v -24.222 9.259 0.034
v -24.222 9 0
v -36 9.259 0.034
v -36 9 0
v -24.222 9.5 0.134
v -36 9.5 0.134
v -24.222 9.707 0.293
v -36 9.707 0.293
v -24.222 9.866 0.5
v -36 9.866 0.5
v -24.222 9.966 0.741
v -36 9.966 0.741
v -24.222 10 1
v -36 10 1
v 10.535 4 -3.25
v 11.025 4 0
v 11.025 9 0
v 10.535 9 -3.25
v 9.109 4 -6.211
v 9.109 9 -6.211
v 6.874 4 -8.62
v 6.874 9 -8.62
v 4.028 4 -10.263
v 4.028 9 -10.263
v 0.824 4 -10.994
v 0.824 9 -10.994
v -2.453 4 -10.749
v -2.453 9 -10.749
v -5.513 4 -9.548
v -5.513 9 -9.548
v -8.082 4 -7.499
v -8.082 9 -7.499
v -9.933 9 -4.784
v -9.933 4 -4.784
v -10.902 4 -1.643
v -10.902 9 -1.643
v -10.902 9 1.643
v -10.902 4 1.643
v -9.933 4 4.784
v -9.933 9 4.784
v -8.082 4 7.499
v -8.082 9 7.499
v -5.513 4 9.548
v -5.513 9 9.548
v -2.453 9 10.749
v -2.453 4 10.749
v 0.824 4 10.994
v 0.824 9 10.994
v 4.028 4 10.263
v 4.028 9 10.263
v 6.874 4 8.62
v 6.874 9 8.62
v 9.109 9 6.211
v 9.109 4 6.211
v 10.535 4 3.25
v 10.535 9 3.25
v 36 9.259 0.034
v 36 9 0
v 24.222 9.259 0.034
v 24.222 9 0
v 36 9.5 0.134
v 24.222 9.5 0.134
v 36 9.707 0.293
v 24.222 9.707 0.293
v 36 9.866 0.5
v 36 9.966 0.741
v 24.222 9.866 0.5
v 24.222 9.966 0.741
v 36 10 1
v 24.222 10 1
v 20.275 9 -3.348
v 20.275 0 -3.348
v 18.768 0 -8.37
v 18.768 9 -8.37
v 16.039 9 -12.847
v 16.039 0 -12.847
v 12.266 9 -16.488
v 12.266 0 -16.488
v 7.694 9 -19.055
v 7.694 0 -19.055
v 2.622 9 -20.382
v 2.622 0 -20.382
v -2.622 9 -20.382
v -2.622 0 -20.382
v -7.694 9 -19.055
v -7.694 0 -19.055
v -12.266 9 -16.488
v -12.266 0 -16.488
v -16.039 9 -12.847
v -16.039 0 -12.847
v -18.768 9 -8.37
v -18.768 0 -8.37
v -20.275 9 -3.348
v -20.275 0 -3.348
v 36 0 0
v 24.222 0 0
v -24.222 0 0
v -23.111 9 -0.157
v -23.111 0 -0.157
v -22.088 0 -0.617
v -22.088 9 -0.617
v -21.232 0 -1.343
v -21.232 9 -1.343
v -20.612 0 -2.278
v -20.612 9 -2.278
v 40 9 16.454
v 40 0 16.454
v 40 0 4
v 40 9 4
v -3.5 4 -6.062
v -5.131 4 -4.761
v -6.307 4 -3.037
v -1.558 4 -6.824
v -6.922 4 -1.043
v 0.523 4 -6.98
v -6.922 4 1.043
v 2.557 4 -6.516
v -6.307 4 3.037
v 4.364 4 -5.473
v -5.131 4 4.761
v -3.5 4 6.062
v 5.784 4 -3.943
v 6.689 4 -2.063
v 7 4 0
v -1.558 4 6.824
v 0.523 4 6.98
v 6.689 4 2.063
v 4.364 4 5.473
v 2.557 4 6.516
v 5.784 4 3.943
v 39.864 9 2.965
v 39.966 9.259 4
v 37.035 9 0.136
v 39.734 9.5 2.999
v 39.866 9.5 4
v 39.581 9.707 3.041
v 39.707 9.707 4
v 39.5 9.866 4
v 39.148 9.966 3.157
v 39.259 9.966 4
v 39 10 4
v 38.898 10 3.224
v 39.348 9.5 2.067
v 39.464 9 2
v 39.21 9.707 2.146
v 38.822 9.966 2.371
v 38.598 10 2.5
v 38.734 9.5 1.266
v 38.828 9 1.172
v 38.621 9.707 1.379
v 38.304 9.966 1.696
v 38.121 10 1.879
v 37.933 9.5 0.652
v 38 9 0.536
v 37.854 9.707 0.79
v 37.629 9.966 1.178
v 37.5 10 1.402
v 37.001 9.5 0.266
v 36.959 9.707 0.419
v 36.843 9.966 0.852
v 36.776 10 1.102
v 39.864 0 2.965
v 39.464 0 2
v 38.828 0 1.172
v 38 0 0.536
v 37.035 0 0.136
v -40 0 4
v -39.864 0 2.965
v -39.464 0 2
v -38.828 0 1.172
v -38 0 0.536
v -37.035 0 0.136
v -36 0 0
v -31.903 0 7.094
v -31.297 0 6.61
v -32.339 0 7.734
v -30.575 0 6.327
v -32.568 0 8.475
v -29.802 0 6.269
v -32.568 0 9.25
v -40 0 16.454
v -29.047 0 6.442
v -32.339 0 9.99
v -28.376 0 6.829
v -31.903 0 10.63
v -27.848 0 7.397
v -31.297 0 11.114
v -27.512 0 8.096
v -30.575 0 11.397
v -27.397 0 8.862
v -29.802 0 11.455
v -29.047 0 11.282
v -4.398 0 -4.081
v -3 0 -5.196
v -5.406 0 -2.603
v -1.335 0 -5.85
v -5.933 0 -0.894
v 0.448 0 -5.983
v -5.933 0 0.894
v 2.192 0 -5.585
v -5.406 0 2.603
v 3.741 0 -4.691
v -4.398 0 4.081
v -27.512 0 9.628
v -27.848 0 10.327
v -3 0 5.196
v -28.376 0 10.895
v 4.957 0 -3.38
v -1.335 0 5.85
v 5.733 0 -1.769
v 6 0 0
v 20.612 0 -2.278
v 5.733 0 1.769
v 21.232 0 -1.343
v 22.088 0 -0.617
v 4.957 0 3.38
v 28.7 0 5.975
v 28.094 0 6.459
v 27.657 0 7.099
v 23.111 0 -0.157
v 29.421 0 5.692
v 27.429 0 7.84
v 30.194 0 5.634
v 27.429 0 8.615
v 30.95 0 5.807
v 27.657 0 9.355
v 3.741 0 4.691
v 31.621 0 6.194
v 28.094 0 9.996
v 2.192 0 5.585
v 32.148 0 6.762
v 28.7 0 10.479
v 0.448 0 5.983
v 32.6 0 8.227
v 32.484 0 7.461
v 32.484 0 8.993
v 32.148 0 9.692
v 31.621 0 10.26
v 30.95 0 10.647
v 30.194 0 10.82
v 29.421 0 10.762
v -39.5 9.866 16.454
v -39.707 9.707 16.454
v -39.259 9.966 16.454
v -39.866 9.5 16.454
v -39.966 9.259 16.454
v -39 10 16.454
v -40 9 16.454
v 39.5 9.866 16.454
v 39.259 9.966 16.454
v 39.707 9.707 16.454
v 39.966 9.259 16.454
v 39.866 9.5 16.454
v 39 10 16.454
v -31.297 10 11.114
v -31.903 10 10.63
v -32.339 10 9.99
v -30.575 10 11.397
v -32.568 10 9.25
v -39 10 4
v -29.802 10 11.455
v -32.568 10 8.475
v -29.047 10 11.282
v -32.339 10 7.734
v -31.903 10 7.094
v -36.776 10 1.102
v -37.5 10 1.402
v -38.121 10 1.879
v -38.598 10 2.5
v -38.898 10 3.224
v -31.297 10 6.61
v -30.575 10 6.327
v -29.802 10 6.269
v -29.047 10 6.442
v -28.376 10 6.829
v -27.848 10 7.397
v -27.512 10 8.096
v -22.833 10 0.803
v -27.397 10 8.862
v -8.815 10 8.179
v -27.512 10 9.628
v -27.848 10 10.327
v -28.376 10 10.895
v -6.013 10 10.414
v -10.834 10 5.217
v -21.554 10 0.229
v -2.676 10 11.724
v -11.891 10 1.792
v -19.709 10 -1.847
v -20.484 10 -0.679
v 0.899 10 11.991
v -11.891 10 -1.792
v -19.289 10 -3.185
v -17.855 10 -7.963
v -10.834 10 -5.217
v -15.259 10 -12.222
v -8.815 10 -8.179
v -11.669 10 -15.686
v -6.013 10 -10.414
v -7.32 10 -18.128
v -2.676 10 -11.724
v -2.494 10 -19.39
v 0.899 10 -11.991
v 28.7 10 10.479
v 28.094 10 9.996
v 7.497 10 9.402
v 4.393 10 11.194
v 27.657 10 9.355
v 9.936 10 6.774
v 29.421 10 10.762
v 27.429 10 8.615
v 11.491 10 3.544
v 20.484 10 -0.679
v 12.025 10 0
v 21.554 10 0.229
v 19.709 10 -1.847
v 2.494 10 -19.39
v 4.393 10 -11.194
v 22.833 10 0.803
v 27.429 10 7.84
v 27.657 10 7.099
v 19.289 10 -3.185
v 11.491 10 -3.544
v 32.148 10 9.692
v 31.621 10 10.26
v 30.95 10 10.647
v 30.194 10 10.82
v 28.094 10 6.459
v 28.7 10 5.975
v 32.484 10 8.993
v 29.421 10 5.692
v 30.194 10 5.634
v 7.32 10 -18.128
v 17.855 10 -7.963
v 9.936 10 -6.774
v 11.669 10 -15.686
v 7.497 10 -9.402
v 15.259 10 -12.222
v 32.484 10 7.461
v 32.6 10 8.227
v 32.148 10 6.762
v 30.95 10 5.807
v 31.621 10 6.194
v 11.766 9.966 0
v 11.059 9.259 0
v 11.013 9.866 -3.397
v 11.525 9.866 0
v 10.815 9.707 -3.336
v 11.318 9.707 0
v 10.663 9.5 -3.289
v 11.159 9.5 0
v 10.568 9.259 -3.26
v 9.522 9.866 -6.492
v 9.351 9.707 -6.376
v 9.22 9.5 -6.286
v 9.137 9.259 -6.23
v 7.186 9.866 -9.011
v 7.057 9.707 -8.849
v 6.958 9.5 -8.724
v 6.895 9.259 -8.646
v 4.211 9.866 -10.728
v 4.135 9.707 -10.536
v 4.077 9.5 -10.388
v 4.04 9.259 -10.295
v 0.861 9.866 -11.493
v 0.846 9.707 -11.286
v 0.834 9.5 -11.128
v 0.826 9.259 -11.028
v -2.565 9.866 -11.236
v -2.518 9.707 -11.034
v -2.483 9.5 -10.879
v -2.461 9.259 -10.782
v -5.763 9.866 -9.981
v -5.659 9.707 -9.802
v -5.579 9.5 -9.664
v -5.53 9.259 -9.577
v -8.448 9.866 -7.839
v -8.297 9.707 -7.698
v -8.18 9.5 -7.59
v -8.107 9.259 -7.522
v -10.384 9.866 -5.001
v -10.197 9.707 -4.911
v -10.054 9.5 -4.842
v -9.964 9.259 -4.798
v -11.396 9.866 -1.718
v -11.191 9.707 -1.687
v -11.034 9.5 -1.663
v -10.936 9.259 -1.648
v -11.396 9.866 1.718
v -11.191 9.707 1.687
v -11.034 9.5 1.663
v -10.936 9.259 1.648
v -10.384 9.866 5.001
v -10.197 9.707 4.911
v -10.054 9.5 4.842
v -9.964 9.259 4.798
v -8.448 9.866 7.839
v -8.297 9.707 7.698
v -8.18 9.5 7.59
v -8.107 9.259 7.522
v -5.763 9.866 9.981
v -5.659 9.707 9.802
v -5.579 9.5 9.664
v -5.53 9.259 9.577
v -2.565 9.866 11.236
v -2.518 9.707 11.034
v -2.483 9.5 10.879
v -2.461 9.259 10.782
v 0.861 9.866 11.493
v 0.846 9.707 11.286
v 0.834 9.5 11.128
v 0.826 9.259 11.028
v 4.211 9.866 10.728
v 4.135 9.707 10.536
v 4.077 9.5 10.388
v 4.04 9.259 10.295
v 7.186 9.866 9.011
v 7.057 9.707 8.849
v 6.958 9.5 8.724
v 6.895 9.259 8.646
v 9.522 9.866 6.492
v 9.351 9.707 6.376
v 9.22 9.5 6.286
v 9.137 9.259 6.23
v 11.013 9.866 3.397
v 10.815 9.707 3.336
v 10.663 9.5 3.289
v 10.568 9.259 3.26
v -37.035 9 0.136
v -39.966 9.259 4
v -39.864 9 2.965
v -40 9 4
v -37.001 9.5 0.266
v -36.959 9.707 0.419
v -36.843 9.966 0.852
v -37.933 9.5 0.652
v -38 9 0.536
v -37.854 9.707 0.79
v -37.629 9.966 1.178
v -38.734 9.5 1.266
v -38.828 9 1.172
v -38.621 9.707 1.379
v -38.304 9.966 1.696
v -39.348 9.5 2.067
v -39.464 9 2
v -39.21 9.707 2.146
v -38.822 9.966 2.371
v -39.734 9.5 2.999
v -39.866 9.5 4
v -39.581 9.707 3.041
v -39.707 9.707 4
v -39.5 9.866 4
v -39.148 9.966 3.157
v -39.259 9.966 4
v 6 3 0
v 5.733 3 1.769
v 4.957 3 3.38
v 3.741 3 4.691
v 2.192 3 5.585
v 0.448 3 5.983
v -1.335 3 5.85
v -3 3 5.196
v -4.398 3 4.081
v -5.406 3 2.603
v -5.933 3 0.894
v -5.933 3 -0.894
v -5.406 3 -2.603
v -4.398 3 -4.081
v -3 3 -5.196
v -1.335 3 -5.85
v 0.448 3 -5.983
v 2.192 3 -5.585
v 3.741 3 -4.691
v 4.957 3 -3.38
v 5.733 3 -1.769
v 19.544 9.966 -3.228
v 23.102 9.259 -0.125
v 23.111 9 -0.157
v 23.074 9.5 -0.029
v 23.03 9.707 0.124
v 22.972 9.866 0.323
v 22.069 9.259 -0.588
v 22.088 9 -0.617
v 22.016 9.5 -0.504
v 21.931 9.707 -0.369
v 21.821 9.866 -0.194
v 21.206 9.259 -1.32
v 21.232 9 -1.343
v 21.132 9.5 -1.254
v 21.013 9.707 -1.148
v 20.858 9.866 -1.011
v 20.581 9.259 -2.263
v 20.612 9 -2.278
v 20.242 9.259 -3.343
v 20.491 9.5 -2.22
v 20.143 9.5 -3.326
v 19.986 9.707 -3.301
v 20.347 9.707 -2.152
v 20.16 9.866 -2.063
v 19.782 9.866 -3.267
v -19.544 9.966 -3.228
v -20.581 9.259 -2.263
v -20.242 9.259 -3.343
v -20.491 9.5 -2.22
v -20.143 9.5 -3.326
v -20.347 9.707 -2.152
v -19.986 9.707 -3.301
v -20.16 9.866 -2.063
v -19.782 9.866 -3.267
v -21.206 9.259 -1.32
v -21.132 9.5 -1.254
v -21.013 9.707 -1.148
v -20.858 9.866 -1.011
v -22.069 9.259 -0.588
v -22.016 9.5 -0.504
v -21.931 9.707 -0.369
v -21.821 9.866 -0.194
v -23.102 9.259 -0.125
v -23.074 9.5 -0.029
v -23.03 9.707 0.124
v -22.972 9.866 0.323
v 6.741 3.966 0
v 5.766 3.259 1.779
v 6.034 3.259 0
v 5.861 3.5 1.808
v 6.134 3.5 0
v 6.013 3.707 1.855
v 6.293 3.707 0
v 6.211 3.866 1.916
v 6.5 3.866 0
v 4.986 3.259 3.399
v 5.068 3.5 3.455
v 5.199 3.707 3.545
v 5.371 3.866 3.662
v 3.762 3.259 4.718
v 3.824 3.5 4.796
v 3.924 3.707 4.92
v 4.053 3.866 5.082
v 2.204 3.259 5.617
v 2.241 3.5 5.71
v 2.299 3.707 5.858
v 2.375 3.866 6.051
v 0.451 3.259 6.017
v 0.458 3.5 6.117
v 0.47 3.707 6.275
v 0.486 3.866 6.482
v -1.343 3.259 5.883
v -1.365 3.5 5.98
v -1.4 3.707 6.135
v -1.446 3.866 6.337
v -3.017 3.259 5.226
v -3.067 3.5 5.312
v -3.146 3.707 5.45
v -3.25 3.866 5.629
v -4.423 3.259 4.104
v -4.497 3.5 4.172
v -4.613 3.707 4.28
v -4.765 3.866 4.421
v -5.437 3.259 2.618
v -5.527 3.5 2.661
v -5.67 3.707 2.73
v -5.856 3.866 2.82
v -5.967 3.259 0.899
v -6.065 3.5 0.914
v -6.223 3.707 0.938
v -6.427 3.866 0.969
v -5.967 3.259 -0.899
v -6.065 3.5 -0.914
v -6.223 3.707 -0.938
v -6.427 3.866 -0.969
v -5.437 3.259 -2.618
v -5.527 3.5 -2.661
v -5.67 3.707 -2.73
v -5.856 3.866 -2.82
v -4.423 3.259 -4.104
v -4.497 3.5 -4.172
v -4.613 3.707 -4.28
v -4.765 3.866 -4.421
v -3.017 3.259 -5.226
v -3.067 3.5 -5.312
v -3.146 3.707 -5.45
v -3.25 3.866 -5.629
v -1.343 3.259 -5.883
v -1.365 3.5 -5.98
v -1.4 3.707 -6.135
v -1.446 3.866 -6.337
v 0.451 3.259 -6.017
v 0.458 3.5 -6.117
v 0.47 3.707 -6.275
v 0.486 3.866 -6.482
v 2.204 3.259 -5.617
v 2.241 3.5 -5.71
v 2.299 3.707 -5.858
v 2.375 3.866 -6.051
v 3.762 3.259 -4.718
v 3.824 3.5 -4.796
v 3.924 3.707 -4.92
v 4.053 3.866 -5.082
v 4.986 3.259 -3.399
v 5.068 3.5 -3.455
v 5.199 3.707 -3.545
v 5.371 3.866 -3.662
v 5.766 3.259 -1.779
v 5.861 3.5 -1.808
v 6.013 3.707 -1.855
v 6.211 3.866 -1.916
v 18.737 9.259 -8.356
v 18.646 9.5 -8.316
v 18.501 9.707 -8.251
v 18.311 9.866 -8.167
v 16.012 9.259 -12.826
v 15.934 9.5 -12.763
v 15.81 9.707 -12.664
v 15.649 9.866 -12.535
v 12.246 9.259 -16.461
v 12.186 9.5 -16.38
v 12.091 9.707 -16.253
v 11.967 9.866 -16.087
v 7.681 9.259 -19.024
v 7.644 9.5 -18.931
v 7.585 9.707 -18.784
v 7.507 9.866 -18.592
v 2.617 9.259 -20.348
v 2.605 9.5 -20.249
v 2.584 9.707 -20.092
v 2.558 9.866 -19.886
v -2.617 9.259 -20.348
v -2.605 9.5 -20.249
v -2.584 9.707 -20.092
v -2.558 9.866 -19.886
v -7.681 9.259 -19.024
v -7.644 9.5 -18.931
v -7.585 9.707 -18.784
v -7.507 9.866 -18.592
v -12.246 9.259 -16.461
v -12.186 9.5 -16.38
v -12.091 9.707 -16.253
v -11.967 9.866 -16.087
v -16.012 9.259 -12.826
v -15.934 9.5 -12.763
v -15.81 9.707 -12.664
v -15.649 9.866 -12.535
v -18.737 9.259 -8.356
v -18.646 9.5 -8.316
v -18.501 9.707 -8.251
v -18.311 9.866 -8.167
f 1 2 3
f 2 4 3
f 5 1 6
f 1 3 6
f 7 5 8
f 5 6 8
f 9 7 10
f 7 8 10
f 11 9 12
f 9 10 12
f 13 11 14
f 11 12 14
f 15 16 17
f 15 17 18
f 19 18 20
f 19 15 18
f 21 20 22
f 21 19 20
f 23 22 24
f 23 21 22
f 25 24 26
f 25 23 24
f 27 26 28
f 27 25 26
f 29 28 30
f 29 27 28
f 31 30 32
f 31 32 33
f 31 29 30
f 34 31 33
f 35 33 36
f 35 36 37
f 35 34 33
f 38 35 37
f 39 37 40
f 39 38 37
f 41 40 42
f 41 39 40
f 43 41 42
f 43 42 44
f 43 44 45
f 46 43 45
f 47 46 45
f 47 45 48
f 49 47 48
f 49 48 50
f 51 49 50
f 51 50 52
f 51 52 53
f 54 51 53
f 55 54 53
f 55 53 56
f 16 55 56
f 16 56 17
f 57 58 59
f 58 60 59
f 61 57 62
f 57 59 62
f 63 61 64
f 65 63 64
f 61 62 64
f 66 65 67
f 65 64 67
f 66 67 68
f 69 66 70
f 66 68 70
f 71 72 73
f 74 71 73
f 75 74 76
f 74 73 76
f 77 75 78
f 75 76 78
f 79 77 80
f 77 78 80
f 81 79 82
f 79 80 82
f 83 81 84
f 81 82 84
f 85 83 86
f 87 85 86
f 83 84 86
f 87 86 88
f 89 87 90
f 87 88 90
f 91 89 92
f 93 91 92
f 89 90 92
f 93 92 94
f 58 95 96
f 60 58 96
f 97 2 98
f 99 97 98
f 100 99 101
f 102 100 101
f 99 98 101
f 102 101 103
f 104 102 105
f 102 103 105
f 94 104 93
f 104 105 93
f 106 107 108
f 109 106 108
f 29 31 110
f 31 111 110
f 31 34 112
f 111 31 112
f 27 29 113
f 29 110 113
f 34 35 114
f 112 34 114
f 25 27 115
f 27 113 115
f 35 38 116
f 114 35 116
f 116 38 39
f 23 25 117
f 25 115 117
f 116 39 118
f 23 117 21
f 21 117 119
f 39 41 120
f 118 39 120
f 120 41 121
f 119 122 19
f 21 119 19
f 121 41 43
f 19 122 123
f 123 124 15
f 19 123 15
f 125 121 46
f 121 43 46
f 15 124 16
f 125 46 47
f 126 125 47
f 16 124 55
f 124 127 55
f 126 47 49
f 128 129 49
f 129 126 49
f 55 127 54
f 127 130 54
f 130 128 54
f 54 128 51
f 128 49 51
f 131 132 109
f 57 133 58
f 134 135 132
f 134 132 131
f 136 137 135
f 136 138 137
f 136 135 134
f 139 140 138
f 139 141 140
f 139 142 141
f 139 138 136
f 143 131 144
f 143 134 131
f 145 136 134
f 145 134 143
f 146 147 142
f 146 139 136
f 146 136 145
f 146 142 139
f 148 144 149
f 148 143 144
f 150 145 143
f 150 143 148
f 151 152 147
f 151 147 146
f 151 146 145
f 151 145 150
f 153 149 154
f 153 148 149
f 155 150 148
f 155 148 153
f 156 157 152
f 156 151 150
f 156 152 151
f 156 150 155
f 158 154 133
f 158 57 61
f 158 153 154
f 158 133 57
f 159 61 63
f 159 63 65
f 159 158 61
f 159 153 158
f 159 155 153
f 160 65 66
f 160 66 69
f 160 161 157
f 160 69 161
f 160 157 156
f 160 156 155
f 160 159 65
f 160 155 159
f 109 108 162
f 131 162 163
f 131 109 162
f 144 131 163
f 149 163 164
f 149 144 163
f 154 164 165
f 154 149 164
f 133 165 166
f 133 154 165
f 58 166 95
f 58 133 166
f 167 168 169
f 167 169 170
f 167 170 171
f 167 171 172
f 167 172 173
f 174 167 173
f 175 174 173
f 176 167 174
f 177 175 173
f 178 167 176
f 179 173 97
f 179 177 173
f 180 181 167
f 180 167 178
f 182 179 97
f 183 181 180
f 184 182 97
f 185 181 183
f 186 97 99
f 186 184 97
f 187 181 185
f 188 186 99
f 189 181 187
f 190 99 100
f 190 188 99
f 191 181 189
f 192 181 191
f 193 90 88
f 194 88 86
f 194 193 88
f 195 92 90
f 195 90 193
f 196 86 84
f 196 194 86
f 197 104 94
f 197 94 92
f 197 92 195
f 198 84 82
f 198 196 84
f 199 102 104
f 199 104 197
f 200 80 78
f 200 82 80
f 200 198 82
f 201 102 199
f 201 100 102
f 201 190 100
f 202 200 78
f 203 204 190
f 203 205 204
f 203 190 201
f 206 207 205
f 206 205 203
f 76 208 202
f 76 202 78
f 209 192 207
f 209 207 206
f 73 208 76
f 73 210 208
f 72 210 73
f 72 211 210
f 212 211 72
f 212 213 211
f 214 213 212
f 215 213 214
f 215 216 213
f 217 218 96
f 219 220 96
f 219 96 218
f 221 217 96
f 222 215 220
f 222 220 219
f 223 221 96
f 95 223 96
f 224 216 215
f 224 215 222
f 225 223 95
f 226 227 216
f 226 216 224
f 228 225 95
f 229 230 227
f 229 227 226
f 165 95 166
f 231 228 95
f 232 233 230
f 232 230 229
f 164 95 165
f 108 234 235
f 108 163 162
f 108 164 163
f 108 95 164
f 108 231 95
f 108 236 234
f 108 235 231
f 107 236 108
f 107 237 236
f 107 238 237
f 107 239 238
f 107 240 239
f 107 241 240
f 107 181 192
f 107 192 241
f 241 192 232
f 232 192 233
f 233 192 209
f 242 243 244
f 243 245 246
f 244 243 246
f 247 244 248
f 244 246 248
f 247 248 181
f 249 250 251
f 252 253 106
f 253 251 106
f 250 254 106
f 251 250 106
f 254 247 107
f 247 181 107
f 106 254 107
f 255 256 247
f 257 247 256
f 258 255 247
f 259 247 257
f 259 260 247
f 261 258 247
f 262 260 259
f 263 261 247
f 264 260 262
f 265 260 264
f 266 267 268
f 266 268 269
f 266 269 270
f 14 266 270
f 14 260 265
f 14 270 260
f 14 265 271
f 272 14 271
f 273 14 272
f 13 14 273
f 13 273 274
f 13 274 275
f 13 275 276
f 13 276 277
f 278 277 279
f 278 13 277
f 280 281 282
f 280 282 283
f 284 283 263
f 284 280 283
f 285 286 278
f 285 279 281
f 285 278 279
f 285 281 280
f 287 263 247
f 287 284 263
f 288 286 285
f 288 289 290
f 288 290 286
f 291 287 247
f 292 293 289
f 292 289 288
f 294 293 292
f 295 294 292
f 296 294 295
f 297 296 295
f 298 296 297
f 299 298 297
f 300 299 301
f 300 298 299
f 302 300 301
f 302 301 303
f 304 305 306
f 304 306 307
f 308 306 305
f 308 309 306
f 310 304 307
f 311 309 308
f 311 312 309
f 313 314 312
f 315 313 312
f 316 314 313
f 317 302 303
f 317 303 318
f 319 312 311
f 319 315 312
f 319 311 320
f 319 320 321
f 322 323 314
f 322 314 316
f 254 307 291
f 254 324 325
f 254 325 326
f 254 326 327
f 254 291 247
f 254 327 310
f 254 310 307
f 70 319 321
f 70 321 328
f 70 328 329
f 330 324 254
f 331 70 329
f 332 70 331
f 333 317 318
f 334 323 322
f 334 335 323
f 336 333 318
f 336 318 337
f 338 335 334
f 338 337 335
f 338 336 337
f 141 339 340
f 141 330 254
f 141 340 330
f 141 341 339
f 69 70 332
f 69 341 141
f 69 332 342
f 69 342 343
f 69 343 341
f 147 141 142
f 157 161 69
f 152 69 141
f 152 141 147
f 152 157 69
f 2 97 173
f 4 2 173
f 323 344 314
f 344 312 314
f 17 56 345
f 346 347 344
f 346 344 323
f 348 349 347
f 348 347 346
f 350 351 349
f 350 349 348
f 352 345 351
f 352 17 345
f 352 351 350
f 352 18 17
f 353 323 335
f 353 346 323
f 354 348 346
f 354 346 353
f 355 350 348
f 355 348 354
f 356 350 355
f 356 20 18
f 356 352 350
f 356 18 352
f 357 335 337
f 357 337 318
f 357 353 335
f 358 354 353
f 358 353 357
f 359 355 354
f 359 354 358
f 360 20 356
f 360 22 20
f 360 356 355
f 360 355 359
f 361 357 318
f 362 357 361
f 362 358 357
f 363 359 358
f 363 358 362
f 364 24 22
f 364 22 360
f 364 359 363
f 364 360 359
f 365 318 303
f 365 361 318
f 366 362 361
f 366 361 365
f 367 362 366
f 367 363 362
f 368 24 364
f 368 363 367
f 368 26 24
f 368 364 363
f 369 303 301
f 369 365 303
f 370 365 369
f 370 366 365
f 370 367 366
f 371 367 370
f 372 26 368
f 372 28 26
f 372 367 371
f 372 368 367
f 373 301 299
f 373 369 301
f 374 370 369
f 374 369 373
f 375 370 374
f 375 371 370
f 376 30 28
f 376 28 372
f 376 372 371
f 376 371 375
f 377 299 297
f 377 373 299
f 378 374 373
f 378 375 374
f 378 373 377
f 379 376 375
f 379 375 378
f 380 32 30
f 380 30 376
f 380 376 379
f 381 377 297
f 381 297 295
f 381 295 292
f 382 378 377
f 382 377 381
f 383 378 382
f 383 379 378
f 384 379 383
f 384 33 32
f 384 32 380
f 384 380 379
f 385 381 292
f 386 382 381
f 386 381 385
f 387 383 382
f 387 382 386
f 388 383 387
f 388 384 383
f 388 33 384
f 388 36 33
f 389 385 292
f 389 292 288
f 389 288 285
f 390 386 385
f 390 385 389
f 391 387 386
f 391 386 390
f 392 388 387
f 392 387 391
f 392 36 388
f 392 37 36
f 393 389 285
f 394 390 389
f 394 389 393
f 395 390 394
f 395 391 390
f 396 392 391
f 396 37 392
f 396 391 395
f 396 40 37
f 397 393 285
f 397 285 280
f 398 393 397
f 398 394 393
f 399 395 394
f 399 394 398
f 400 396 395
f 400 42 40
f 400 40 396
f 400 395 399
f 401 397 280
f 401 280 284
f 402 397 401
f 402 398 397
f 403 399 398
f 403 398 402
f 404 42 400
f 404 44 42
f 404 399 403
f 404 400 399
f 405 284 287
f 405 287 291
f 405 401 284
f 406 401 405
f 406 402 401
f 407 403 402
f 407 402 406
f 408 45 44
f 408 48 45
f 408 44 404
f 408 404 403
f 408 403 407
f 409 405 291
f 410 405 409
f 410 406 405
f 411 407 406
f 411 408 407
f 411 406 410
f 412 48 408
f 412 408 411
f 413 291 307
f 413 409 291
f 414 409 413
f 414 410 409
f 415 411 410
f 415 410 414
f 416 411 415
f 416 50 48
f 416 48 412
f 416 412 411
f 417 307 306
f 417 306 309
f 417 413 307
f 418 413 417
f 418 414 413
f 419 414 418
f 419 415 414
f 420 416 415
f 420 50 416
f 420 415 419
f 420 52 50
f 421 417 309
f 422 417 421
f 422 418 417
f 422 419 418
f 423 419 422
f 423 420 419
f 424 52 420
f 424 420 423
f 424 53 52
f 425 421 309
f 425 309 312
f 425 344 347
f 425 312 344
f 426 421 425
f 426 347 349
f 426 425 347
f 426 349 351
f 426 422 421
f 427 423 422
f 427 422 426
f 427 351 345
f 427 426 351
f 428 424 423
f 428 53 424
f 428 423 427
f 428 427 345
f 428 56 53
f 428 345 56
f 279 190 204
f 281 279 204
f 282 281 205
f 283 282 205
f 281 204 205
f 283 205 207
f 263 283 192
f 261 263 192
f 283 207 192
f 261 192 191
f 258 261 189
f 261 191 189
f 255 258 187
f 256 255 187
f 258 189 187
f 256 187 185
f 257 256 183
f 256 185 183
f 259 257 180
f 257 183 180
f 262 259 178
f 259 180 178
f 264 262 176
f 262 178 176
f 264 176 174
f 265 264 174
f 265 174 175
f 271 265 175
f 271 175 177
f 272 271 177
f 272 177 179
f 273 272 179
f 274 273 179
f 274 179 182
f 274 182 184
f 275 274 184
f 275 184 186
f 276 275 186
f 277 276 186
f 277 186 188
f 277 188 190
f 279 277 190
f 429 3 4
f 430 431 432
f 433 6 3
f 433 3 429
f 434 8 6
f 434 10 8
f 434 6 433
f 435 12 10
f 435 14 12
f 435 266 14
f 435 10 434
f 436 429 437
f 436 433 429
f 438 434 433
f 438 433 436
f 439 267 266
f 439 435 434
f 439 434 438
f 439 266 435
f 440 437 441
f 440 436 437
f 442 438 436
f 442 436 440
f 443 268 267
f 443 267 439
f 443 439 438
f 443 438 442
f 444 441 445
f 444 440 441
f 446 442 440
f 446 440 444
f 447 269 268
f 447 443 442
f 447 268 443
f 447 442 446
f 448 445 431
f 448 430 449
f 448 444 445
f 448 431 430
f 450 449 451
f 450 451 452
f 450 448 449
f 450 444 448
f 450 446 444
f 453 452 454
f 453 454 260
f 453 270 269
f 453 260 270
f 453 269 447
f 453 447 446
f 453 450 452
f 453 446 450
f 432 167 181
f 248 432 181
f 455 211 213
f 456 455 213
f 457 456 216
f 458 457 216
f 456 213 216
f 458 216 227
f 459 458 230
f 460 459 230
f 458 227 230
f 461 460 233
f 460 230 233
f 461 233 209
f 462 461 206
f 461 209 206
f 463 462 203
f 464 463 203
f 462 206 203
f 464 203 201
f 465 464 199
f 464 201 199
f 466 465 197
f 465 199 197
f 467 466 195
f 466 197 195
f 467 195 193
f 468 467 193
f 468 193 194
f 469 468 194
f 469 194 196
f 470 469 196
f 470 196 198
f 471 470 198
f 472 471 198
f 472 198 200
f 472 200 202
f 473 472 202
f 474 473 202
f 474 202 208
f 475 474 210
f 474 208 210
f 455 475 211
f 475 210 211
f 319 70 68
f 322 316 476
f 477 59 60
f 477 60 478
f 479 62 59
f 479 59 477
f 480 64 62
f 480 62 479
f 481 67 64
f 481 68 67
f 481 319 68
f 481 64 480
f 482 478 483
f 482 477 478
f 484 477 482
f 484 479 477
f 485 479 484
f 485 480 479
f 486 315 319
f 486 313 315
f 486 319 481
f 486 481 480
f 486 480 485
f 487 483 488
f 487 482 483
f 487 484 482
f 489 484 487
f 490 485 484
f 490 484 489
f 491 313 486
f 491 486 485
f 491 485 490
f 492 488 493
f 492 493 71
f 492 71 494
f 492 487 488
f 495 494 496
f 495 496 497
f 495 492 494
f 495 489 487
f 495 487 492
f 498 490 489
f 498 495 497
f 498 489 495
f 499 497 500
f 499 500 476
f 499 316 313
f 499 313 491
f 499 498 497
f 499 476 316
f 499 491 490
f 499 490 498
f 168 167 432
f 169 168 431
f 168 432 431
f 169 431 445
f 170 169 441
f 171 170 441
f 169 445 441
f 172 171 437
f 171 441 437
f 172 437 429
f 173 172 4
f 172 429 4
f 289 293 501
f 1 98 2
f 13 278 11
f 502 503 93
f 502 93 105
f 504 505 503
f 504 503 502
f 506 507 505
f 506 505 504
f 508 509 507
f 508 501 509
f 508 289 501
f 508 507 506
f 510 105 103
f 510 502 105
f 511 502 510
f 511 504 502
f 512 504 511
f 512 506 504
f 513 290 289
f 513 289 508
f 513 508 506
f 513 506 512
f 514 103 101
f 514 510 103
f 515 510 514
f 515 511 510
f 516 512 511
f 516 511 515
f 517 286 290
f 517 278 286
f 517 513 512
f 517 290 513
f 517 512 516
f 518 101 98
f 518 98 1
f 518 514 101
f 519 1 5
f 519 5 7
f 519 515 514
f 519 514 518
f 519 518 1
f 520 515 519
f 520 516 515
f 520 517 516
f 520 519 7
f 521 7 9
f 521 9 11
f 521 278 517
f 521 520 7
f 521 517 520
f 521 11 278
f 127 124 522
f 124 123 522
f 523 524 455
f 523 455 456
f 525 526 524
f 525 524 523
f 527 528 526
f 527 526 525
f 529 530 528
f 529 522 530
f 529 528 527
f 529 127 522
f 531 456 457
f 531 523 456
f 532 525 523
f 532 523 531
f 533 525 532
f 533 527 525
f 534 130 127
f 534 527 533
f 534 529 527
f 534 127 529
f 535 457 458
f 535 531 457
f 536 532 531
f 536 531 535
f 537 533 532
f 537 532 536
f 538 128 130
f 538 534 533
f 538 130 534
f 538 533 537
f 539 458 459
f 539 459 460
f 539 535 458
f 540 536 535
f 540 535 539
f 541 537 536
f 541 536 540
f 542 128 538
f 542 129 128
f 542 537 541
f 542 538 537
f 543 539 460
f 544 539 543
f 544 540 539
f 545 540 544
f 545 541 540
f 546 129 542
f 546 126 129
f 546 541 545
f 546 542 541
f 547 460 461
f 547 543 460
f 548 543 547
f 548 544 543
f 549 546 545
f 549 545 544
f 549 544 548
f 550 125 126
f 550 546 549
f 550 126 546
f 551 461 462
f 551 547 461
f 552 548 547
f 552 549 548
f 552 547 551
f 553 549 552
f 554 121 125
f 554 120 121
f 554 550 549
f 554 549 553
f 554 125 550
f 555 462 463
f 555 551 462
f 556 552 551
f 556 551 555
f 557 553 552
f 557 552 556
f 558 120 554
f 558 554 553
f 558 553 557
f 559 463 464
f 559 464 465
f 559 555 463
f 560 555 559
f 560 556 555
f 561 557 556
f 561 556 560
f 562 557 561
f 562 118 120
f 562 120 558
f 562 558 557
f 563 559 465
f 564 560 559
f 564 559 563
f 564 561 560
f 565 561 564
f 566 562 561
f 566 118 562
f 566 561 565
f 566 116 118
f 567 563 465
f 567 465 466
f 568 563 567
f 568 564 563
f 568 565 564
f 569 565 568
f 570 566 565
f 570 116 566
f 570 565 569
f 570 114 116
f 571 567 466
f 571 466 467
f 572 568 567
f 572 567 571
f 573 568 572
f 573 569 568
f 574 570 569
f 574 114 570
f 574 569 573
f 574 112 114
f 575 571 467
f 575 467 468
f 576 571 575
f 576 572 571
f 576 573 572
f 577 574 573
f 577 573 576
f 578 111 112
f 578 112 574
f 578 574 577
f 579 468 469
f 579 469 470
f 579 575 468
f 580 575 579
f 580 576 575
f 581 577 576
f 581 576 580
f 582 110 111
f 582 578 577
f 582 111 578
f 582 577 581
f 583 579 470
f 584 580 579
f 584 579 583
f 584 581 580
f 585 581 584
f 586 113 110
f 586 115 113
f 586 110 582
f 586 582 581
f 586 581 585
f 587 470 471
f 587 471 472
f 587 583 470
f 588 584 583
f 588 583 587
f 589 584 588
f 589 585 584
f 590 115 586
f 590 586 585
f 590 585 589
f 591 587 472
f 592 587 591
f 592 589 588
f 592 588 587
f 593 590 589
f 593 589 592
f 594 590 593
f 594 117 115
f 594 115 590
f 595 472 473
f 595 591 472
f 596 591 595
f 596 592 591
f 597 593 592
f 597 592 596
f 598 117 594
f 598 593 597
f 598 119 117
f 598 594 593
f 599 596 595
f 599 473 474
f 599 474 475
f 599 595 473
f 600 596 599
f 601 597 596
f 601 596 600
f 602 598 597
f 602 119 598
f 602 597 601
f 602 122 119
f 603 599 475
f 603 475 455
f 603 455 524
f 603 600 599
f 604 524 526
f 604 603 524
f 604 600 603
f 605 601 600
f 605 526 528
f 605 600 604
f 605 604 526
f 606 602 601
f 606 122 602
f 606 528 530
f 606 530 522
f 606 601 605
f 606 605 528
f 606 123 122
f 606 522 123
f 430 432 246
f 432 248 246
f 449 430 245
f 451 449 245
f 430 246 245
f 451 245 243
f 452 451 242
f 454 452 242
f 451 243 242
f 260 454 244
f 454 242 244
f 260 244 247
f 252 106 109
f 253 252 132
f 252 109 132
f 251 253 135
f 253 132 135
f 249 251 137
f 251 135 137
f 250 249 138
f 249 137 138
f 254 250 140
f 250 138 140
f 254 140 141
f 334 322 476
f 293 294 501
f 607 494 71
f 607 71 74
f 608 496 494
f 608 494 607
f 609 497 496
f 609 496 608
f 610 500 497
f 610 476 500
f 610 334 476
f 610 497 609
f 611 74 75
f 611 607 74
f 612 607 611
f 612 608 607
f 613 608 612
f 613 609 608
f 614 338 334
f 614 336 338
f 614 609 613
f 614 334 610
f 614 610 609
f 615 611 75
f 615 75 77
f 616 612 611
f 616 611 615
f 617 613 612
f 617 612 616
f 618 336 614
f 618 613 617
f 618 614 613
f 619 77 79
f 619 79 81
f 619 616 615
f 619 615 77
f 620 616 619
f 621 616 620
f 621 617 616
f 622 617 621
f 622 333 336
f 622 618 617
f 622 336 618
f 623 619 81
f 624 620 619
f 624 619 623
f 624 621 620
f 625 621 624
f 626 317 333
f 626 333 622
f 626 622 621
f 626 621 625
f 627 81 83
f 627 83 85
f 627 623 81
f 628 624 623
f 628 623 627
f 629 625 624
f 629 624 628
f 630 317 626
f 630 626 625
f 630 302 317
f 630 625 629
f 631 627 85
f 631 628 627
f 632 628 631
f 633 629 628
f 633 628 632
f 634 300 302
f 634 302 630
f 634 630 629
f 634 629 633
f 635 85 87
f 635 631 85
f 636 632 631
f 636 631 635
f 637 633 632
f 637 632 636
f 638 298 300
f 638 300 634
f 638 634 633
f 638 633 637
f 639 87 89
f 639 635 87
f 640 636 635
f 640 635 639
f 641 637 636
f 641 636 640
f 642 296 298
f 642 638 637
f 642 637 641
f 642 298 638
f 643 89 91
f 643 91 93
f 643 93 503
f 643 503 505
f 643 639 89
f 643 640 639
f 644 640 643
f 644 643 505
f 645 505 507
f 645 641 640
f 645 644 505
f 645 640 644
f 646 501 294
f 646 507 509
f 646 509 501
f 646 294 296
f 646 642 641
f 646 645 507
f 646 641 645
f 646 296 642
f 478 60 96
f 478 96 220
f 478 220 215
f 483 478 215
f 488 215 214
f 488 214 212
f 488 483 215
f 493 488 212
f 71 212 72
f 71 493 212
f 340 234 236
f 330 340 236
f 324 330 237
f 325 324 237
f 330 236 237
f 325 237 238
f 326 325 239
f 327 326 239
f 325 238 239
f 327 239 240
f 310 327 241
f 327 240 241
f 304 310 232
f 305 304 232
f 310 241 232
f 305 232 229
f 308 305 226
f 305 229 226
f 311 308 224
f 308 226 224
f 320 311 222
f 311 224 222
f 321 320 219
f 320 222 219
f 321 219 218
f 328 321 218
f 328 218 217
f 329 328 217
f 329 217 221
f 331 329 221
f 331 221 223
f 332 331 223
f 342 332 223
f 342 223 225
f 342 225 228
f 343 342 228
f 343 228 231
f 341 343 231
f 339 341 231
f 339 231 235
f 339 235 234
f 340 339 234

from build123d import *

# Parameters (mm, degrees)
SKETCH1_R           = 11.025
BOSS_EXTRUDE1_DEPTH = 10
SKETCH3_R           = 11.025
SKETCH3_R_2         = 6
BOSS_EXTRUDE2_DEPTH = 4
FILLET1_R           = 4
FILLET2_R           = 1
CUT_EXTRUDE1_REACH  = 12
SKETCH4_R           = 2.6


with BuildPart() as part:
    # Sketch1 → Boss-Extrude1 (new body)
    with BuildSketch(Plane(origin=(0, 0, 0), x_dir=(1, 0, 0), z_dir=(0, 1, 0))):
        with BuildLine():
            Line((-40, -16.45412), (40, -16.45412))
            Line((40, -16.45412), (40, 0))
            Line((40, 0), (20.55, 0))
            ThreePointArc((20.55, 0), (0, 20.55), (-20.55, 0))
            Line((-20.55, 0), (-40, 0))
            Line((-40, 0), (-40, -16.45412))
        make_face()
        Circle(SKETCH1_R, mode=Mode.SUBTRACT)
    extrude(amount=BOSS_EXTRUDE1_DEPTH)

    # Sketch3 → Boss-Extrude2 (add)
    with BuildSketch(Plane.XZ):
        Circle(SKETCH3_R)
        Circle(SKETCH3_R_2, mode=Mode.SUBTRACT)
    extrude(amount=-BOSS_EXTRUDE2_DEPTH)

    # Fillet1
    fillet1_edges = [part.edges().sort_by_distance(p)[0] for p in [
        (-40, 5, 0),
        (-20.55, 5, 0),
        (20.55, 5, 0),
        (40, 5, 0),
    ]]
    fillet(fillet1_edges, radius=FILLET1_R)

    # Fillet2
    fillet2_edges = [part.edges().sort_by_distance(p)[0] for p in [
        (40, 10, 10.22706),
        (-11.025, 10, 0),
        (-6, 4, 0),
        (-40, 10, 10.22706),
        (-30.110971266, 10, 0),
        (30.110971266, 10, 0),
        (0, 10, -20.55),
        (38.828427125, 10, 1.171572875),
        (-38.828427125, 10, 1.171572875),
        (-21.634175603, 10, -0.949842246),
        (21.634175603, 10, -0.949842246),
    ]]
    fillet(fillet2_edges, radius=FILLET2_R)

    # Sketch4 → Cut-Extrude1 (cut, up to next)
    with BuildSketch(Plane.XZ, mode=Mode.PRIVATE) as cut_extrude1_sk1:
        with Locations((30, 8.22706)):
            Circle(SKETCH4_R)
    cut_extrude1_tool1 = extrude(cut_extrude1_sk1.sketch, amount=-CUT_EXTRUDE1_REACH, mode=Mode.PRIVATE) & part.part
    add(cut_extrude1_tool1.solids().sort_by_distance((30, 0, 8.22706))[0], mode=Mode.SUBTRACT)
    # Sketch4 → Cut-Extrude1 (cut, up to next)
    with BuildSketch(Plane.XZ, mode=Mode.PRIVATE) as cut_extrude1_sk2:
        with Locations((-29.996640074, 8.862024441)):
            Circle(SKETCH4_R)
    cut_extrude1_tool2 = extrude(cut_extrude1_sk2.sketch, amount=-CUT_EXTRUDE1_REACH, mode=Mode.PRIVATE) & part.part
    add(cut_extrude1_tool2.solids().sort_by_distance((-29.99664, 0, 8.862024))[0], mode=Mode.SUBTRACT)


solid = part.part
